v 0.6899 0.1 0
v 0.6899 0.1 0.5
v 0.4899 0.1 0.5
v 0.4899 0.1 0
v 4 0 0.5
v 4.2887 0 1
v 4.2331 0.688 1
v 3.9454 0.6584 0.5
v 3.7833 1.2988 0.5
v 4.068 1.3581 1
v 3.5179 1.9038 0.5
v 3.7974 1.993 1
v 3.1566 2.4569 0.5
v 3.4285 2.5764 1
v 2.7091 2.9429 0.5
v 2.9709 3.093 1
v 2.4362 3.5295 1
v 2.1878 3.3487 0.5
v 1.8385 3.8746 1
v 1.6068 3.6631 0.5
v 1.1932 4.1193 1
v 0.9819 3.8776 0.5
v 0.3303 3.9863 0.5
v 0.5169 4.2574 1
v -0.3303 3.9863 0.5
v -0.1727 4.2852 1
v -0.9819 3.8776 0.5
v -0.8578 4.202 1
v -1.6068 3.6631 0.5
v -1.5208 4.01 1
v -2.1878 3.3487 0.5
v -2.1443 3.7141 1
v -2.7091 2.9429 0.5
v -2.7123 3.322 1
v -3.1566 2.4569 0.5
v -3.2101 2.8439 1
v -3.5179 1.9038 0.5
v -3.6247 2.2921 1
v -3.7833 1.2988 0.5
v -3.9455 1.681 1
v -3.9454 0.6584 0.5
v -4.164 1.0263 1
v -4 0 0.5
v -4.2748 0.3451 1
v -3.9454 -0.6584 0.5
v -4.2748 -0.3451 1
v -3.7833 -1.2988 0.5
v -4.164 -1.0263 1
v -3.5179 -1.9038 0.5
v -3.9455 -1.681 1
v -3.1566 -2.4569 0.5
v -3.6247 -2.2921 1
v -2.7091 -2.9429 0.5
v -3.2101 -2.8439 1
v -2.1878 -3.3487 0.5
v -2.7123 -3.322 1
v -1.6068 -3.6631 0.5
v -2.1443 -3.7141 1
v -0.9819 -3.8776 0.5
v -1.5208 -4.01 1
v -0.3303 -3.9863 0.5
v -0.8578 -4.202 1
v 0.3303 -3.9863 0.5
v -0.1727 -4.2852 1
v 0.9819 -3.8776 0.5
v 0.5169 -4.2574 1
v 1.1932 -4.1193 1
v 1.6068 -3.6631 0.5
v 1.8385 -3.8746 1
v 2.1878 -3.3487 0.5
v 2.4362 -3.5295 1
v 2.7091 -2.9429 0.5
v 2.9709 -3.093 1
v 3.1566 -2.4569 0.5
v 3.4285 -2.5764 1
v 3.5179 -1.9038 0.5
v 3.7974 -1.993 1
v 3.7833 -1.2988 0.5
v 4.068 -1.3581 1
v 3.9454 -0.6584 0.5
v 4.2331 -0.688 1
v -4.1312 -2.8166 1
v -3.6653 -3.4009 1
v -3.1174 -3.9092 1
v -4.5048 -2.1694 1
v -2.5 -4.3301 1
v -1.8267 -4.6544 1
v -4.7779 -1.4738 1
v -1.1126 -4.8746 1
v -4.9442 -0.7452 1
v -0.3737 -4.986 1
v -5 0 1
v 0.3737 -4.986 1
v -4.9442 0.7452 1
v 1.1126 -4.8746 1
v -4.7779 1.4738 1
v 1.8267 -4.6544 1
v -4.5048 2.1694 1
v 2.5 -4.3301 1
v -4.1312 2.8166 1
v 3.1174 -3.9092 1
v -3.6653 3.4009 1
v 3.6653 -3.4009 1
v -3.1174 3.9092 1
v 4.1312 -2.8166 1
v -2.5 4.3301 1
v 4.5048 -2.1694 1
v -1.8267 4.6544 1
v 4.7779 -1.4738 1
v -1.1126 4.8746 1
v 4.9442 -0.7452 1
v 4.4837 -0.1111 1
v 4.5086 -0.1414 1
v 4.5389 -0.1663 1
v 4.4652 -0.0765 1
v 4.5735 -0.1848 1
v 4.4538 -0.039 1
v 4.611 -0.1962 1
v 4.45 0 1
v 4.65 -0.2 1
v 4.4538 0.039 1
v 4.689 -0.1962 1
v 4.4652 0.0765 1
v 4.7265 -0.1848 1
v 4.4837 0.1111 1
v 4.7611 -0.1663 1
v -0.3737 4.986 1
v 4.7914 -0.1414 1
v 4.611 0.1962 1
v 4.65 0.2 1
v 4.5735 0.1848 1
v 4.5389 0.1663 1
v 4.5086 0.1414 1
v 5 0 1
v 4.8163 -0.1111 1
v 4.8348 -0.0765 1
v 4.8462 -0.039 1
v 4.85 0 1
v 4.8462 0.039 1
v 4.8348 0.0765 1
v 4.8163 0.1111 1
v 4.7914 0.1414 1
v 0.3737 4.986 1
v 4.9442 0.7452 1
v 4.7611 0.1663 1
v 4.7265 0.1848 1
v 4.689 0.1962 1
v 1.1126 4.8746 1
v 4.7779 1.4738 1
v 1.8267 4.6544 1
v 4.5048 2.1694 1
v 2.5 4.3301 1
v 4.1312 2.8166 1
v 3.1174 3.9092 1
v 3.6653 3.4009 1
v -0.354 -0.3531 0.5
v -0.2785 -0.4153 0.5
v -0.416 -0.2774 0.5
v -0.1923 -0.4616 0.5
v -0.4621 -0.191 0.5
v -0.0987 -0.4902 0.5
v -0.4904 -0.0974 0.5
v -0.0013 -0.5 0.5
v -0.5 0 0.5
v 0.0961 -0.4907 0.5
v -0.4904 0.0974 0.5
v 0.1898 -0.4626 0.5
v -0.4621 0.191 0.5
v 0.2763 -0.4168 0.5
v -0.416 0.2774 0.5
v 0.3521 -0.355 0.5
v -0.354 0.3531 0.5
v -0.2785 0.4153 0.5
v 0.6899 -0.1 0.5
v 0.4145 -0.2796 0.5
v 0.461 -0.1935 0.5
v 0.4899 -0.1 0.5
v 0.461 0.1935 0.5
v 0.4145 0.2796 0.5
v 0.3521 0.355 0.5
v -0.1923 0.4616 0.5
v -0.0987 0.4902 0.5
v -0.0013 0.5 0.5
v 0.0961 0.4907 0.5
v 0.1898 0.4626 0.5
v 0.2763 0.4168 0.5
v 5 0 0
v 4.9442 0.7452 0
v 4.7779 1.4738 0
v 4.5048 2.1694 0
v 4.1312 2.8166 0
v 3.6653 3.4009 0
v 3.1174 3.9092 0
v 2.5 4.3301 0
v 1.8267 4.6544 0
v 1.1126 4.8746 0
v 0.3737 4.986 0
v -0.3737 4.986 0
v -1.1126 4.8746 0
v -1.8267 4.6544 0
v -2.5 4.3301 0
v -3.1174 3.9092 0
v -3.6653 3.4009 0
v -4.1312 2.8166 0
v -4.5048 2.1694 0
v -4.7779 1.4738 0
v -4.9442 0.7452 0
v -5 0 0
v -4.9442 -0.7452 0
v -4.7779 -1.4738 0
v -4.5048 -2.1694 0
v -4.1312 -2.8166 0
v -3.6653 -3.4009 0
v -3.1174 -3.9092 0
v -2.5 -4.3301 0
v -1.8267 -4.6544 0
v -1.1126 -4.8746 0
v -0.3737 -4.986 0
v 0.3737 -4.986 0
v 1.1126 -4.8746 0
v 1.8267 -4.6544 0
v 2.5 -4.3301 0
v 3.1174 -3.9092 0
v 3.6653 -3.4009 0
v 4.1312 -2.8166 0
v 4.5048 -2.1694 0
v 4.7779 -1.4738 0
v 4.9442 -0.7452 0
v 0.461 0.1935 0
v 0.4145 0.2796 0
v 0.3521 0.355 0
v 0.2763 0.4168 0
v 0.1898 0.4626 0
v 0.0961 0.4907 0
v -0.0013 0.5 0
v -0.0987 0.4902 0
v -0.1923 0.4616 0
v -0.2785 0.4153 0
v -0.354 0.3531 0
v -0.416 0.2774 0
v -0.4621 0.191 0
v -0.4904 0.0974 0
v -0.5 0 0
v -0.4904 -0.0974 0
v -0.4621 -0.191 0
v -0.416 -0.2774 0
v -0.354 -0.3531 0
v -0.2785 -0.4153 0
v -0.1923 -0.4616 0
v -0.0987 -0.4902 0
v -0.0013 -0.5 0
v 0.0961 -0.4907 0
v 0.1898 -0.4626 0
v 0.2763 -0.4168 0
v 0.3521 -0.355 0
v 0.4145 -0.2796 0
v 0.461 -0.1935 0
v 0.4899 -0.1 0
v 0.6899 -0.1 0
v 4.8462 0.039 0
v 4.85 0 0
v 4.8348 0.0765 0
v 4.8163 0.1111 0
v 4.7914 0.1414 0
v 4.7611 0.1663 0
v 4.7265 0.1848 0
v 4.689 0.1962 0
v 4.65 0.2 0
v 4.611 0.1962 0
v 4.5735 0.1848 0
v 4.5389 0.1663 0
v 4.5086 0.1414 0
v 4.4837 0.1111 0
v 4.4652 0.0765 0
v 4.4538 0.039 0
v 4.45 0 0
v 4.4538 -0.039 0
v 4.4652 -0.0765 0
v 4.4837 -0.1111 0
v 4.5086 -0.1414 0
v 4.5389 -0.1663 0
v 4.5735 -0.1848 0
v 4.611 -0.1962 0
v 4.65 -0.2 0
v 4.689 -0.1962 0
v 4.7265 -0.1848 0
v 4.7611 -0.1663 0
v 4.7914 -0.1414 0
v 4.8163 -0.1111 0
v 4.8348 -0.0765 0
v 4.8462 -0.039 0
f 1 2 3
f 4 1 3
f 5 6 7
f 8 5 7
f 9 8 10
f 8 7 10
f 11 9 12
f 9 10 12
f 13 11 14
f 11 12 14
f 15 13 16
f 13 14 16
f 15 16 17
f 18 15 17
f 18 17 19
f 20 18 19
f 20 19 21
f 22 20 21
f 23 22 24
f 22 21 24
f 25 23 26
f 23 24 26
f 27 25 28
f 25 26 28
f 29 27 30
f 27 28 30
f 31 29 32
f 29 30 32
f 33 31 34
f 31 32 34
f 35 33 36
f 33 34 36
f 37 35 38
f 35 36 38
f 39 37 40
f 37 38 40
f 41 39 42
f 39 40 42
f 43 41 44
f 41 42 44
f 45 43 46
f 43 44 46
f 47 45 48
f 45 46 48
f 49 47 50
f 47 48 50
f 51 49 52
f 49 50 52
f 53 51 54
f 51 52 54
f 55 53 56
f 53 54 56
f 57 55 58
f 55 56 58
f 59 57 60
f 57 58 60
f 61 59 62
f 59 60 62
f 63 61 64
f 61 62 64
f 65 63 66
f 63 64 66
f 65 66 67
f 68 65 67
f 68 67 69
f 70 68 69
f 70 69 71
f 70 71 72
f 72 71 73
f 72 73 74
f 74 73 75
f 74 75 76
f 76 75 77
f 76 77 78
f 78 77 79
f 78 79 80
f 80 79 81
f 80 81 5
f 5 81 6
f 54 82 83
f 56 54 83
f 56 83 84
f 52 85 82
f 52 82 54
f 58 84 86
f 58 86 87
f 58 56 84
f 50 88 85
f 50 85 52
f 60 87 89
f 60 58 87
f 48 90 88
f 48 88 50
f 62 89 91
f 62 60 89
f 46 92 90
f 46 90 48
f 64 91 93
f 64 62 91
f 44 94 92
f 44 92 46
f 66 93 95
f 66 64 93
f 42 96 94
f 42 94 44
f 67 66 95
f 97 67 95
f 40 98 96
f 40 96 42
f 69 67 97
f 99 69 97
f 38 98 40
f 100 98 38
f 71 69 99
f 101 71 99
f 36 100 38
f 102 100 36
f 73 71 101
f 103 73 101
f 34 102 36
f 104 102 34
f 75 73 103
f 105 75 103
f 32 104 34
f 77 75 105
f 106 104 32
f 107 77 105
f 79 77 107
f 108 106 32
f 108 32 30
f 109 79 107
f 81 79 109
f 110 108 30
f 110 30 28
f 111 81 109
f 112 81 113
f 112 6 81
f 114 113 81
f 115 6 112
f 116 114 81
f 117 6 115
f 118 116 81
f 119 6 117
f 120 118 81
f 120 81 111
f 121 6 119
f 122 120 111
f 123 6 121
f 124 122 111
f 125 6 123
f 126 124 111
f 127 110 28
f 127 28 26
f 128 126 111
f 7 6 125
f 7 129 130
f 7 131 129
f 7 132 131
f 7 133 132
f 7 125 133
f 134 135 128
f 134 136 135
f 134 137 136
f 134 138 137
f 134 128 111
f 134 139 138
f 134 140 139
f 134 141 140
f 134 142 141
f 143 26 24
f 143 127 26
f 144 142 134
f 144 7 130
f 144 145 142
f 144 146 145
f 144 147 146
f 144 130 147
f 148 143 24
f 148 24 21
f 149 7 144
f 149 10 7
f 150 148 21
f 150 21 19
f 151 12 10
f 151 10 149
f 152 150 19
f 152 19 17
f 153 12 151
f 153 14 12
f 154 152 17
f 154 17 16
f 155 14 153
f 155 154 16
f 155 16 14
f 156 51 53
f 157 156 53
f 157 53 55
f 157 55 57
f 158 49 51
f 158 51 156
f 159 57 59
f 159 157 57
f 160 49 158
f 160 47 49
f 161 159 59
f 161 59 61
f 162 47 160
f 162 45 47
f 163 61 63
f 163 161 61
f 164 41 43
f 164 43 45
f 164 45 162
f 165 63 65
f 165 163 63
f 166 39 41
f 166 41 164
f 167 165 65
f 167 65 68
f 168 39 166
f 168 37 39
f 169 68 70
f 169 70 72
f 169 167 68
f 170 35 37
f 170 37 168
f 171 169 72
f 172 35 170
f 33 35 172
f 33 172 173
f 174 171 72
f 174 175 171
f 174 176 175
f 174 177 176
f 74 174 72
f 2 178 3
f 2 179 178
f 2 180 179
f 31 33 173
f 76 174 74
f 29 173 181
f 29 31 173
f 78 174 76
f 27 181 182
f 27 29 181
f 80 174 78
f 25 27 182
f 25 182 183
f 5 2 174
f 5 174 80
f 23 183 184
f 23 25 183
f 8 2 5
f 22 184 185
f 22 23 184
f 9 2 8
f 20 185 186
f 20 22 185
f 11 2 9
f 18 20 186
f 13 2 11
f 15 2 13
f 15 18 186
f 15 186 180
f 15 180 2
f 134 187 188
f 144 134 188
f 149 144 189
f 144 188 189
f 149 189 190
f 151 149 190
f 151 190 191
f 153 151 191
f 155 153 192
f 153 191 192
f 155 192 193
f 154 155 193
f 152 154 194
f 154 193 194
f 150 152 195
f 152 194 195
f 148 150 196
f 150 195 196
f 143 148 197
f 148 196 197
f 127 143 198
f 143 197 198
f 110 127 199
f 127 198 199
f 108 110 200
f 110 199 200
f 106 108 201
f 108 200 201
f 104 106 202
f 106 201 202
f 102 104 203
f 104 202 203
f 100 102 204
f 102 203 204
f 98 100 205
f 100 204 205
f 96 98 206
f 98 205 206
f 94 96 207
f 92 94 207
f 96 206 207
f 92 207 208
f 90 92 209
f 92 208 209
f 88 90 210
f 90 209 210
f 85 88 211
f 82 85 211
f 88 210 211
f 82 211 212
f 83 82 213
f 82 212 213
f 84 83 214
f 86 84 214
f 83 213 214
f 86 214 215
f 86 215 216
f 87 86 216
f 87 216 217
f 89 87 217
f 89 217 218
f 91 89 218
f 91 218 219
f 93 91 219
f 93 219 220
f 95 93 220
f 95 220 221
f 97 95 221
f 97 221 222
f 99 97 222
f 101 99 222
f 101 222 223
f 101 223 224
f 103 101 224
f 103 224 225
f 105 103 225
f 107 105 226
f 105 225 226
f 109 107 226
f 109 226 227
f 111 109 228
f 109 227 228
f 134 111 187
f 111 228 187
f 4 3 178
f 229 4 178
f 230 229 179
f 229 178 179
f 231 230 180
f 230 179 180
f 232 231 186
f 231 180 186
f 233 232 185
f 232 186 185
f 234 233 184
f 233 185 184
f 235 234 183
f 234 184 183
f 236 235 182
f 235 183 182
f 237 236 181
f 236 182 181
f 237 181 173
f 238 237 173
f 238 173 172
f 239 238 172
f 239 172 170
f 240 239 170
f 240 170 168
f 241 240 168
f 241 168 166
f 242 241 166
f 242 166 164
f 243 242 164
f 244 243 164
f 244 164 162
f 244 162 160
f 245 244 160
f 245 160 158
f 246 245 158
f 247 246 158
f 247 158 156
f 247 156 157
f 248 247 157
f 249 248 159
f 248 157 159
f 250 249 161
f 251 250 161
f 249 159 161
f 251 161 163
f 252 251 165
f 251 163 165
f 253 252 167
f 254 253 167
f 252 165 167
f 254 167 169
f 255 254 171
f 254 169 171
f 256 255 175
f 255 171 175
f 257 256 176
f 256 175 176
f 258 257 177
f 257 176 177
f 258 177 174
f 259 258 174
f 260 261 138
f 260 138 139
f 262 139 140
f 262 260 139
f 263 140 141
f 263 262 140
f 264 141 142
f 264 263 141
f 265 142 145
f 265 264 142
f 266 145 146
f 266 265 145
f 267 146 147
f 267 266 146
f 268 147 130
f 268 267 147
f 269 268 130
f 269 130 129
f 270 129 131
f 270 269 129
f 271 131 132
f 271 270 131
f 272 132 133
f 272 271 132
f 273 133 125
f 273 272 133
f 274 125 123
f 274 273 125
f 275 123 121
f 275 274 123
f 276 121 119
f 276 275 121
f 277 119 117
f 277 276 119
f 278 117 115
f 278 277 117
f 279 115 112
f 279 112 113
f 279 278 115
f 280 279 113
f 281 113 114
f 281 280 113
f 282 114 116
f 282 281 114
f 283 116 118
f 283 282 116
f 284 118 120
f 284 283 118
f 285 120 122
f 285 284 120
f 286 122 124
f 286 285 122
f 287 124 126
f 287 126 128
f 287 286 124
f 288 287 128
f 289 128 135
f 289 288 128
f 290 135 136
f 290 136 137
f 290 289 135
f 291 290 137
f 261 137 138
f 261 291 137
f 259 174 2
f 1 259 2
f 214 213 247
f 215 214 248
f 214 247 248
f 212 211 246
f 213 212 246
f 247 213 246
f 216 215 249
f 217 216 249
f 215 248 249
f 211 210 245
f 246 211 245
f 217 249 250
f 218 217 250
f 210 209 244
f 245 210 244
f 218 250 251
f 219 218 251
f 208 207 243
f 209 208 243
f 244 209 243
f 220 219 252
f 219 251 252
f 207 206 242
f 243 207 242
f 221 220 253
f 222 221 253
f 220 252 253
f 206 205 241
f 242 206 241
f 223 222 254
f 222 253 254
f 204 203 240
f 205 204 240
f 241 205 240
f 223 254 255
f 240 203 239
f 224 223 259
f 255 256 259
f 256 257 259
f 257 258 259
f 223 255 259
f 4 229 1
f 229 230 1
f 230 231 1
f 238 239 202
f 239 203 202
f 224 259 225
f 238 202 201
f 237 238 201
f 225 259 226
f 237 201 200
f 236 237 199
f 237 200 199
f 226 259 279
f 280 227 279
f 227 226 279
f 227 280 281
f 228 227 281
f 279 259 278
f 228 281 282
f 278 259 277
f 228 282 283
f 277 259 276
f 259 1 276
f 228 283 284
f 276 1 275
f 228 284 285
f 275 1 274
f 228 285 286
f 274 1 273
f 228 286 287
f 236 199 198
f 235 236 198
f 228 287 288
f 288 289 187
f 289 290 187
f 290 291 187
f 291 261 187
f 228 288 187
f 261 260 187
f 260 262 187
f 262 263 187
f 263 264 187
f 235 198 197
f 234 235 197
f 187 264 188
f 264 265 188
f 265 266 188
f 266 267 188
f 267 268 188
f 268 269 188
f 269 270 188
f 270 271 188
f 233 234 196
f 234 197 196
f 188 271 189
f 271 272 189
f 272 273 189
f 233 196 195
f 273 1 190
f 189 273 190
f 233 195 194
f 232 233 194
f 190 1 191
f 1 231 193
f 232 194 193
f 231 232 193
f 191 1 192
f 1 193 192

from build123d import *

# Parameters (mm, degrees)
F0_R     = 5
F0_R_2   = 4
F0_R_3   = 0.2
F1_DEPTH = 1
F2_DEPTH = 0.5
F4_DEPTH = 25
F5_SIZE2 = 0.288665
F5_SIZE  = 0.49999


# Not quite as in the source:
# - a fillet or chamfer is up to 0.001 mm smaller than in the source, because OpenCascade refuses the exact size


with BuildPart() as f1:
    # F0 (on Top) → F1 (new body)
    with BuildSketch(Plane.XY):
        Circle(F0_R)
        Circle(F0_R_2, mode=Mode.SUBTRACT)
        with Locations((4.65, 0)):
            Circle(F0_R_3, mode=Mode.SUBTRACT)
    extrude(amount=F1_DEPTH)

    # F0 (on Top) → F2 (join)
    with BuildSketch(Plane.XY):
        Circle(F0_R_2)
    extrude(amount=F2_DEPTH)

    # F3 (on face) → F4 (cut)
    with BuildSketch(Plane.XY.offset(0.5)):
        with BuildLine():
            ThreePointArc((0.4898979486, -0.1), (0.4974680765, -0.050254481), (0.5, 0))
            ThreePointArc((0.5, 0), (0.4974680765, 0.050254481), (0.4898979486, 0.1))
            ThreePointArc((0.4898979486, 0.1), (-0.5, 0), (0.4898979486, -0.1))
        make_face()
        with BuildLine():
            ThreePointArc((0.4898979486, 0.1), (0.4974680765, 0.050254481), (0.5, 0))
            ThreePointArc((0.5, 0), (0.4974680765, -0.050254481), (0.4898979486, -0.1))
            Line((0.4898979486, -0.1), (0.6898979486, -0.1))
            Line((0.6898979486, -0.1), (0.6898979486, 0))
            Line((0.6898979486, 0), (0.6898979486, 0.1))
            Line((0.6898979486, 0.1), (0.4898979486, 0.1))
        make_face()
    extrude(amount=-F4_DEPTH, mode=Mode.SUBTRACT)

    # F5 (size 0.5 and 0.2886751346 in the source; OpenCascade refuses exactly that, so slightly less here)
    f5_edges = [f1.edges().sort_by_distance(p)[0] for p in [
        (-4, 0, 1),
    ]]
    f5_side = f1.faces().sort_by_distance((-4, 0, 0.75))[0]
    chamfer(f5_edges, length=F5_SIZE, length2=F5_SIZE2, reference=f5_side)


solid = f1.part
